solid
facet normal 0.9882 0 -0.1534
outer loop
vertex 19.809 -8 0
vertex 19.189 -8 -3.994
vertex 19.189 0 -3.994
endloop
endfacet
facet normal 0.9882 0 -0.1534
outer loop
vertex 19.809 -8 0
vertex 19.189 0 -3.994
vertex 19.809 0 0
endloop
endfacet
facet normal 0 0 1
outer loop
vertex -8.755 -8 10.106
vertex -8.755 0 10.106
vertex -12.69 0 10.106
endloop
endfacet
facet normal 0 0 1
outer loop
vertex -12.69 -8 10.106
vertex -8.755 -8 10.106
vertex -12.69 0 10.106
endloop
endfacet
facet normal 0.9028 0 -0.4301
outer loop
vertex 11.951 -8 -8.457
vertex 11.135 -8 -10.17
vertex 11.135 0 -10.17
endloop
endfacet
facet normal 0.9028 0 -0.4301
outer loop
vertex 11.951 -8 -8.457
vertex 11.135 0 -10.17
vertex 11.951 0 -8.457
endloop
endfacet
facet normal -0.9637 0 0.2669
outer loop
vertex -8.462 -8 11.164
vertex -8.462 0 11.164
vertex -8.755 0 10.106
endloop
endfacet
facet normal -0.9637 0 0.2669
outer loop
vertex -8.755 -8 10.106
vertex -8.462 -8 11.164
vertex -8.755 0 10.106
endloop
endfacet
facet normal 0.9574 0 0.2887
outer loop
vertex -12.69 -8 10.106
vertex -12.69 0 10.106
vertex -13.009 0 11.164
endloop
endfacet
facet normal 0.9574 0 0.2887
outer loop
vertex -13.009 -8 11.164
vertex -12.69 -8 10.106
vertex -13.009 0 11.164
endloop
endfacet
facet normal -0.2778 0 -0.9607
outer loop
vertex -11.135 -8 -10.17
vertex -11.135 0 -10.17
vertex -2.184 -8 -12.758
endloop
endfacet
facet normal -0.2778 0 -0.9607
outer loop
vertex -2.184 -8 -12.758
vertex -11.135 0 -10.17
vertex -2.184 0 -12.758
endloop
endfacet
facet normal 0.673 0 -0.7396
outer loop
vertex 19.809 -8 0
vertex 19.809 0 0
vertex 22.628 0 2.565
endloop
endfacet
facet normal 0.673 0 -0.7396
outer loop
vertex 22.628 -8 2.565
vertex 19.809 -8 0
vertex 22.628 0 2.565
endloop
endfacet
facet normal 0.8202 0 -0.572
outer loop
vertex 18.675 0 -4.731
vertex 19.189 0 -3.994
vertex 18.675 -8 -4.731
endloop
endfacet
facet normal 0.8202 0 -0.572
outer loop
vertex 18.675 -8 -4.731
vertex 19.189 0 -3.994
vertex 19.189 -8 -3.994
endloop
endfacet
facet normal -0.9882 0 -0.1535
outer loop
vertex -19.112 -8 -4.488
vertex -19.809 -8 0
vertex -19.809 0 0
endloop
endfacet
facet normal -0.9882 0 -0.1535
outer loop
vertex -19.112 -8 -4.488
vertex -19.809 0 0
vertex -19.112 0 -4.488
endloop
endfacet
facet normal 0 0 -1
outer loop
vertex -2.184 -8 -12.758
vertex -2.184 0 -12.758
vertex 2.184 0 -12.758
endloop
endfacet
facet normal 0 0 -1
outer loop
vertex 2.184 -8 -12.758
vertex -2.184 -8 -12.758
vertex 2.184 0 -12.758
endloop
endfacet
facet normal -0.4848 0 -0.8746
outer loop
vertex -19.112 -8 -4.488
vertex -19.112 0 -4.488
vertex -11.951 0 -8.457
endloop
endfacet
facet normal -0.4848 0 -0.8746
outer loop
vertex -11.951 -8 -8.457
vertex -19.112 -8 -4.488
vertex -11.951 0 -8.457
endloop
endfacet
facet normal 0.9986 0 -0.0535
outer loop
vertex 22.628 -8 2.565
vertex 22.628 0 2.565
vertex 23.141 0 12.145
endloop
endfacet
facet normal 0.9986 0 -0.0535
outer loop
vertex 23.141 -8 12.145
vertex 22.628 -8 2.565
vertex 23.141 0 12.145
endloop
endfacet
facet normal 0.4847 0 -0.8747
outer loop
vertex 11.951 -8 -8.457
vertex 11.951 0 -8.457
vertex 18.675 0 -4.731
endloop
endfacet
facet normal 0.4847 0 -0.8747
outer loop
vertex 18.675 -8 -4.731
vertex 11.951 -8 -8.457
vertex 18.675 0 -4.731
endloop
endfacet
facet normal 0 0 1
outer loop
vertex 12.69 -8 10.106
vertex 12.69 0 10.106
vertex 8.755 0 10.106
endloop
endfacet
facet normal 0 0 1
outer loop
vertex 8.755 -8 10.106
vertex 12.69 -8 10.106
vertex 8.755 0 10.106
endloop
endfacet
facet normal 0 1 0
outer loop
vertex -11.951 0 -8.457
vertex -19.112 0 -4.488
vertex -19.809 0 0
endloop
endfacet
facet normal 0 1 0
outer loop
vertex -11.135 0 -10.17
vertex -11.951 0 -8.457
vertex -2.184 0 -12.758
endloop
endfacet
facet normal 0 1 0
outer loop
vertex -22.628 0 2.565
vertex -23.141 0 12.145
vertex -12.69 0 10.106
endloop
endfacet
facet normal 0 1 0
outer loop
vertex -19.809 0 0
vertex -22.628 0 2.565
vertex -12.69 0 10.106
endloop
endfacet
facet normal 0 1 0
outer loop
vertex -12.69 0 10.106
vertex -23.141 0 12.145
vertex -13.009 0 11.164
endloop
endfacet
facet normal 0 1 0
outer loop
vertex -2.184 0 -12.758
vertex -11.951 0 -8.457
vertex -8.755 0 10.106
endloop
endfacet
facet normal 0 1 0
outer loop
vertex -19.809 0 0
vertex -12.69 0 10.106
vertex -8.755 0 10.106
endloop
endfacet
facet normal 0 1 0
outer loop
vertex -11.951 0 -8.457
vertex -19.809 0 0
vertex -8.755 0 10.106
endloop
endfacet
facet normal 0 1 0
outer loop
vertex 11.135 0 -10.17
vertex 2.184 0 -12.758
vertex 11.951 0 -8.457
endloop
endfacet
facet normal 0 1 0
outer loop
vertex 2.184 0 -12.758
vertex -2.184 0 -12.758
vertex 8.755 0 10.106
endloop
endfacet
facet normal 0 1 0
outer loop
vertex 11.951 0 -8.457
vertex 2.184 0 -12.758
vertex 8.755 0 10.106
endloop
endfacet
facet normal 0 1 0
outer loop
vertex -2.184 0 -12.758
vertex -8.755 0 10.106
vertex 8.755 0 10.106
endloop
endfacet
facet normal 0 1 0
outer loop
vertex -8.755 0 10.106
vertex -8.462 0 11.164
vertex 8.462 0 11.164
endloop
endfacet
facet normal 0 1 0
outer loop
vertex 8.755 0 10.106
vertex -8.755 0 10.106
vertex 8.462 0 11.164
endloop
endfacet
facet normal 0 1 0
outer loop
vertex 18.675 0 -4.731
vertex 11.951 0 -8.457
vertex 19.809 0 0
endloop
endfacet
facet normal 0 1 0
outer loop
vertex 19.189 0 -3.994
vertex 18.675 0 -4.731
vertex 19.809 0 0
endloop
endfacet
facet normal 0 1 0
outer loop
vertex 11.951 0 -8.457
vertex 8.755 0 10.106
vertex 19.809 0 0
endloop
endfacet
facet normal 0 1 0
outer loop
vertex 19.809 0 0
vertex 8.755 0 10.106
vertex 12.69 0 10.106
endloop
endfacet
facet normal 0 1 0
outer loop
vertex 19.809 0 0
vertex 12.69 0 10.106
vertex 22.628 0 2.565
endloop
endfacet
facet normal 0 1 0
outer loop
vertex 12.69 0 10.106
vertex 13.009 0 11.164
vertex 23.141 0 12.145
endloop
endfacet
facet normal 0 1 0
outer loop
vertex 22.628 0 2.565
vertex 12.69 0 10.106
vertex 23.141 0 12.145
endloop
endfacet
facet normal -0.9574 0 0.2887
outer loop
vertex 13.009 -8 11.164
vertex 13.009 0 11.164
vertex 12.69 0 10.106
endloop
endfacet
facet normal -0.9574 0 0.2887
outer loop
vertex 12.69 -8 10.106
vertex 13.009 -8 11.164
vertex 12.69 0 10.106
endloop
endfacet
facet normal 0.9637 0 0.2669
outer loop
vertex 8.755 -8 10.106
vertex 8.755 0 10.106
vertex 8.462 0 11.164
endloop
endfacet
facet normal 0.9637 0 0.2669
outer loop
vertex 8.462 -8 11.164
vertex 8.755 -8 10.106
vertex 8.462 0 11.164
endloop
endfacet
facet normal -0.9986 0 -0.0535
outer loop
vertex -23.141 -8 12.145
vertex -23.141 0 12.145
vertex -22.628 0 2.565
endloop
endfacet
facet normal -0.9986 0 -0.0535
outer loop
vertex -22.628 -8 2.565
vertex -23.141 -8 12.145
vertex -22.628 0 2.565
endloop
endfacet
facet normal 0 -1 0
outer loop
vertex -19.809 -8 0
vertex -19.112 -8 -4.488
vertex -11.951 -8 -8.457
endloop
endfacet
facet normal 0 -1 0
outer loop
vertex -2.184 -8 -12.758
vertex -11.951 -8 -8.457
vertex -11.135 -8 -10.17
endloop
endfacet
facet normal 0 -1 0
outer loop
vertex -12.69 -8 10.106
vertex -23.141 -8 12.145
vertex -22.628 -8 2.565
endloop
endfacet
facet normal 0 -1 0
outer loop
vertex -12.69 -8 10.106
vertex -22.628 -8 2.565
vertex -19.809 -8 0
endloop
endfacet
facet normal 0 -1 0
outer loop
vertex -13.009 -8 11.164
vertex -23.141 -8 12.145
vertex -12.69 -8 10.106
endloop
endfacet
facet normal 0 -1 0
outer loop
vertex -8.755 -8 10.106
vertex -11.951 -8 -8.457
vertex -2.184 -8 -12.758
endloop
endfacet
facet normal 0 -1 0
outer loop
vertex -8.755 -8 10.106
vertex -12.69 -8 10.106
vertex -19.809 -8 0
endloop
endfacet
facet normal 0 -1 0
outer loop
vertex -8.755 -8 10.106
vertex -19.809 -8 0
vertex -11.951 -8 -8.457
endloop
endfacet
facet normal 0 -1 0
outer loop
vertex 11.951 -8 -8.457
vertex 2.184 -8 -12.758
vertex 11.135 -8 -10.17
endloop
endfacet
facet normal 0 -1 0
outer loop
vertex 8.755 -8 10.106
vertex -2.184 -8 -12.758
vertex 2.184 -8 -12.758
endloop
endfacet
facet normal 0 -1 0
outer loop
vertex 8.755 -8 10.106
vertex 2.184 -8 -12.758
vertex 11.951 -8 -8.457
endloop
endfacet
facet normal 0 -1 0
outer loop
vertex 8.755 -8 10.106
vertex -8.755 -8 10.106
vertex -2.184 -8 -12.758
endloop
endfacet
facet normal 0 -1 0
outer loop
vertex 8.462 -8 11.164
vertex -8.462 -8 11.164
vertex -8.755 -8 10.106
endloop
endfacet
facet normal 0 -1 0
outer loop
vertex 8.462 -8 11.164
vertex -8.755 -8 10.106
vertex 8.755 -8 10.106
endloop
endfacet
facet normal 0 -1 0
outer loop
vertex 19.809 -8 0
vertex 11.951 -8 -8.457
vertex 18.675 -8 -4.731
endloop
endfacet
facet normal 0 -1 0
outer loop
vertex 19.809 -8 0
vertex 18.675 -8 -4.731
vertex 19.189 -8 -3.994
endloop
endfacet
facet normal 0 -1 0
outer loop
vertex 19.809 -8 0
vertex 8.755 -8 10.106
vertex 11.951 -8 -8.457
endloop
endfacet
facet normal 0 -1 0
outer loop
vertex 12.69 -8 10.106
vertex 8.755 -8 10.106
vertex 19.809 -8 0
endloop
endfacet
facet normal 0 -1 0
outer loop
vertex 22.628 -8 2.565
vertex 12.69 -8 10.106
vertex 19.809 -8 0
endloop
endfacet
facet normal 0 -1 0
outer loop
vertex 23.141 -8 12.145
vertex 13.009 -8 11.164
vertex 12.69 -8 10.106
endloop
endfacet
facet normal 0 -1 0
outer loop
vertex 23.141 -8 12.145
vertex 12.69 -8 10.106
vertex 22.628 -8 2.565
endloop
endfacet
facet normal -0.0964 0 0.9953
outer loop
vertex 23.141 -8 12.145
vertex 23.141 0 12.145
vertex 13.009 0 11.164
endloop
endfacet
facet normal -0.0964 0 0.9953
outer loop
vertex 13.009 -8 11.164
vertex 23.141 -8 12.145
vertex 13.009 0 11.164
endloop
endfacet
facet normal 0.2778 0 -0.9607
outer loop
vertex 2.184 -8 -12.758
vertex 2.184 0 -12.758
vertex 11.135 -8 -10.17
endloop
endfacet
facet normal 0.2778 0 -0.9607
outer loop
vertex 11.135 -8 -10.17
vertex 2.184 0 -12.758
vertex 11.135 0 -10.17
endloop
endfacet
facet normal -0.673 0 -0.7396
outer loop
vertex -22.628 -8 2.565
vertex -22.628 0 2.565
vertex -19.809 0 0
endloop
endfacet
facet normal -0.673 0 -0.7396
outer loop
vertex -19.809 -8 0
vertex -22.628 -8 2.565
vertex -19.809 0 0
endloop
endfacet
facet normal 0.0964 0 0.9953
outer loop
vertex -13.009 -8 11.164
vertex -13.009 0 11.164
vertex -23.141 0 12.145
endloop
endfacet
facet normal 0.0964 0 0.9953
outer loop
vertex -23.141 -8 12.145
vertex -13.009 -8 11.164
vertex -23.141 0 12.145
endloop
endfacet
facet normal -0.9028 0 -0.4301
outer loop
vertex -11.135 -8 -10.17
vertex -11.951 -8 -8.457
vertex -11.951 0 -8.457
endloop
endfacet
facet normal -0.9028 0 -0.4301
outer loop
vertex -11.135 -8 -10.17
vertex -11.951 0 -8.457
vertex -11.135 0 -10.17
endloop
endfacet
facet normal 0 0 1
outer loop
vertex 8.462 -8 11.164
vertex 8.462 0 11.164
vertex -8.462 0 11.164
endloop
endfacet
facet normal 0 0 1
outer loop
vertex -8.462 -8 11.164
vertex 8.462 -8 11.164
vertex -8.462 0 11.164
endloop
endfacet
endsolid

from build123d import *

# Parameters (mm, degrees)
F1_DEPTH = 8
F2_DEPTH = 8
F3_SIZE  = 0.5


with BuildPart() as f1:
    # F0 (on Front) → F1 (new body)
    with BuildSketch(Plane.XZ):
        Polygon((-13.009408, 11.163666), (-23.141133, 12.144796), (-22.627911, 2.564639), (-19.80859, 0), (-19.112445, -4.488478), (-11.951118, -8.457113), (-11.135481, -10.169796), (-2.184, -12.757975), (0, -12.757975), (2.184, -12.757975), (11.135481, -10.169796), (11.951118, -8.457113), (19.112445, -4.488478), (19.80859, 0), (22.627911, 2.564639), (23.141133, 12.144796), (13.009408, 11.163666), (12.689522, 10.10592), (8.754815, 10.10592), (8.461545, 11.163666), (0, 11.163666), (-8.461545, 11.163666), (-8.754815, 10.10592), (-12.689522, 10.10592), align=None)
    extrude(amount=F1_DEPTH)

    # F0 (on Front) → F2 (join)
    with BuildSketch(Plane.XZ):
        Polygon((-13.009408, 11.163666), (-23.141133, 12.144796), (-22.627911, 2.564639), (-19.80859, 0), (-19.112445, -4.488478), (-11.951118, -8.457113), (-11.135481, -10.169796), (-2.184, -12.757975), (0, -12.757975), (2.184, -12.757975), (11.135481, -10.169796), (11.951118, -8.457113), (19.112445, -4.488478), (19.80859, 0), (22.627911, 2.564639), (23.141133, 12.144796), (13.009408, 11.163666), (12.689522, 10.10592), (8.754815, 10.10592), (8.461545, 11.163666), (0, 11.163666), (-8.461545, 11.163666), (-8.754815, 10.10592), (-12.689522, 10.10592), align=None)
    extrude(amount=F2_DEPTH)

    # F3
    f3_edges = [f1.edges().sort_by_distance(p)[0] for p in [
        (19.112445, -4, -4.488478),
    ]]
    chamfer(f3_edges, length=F3_SIZE)


solid = f1.part
